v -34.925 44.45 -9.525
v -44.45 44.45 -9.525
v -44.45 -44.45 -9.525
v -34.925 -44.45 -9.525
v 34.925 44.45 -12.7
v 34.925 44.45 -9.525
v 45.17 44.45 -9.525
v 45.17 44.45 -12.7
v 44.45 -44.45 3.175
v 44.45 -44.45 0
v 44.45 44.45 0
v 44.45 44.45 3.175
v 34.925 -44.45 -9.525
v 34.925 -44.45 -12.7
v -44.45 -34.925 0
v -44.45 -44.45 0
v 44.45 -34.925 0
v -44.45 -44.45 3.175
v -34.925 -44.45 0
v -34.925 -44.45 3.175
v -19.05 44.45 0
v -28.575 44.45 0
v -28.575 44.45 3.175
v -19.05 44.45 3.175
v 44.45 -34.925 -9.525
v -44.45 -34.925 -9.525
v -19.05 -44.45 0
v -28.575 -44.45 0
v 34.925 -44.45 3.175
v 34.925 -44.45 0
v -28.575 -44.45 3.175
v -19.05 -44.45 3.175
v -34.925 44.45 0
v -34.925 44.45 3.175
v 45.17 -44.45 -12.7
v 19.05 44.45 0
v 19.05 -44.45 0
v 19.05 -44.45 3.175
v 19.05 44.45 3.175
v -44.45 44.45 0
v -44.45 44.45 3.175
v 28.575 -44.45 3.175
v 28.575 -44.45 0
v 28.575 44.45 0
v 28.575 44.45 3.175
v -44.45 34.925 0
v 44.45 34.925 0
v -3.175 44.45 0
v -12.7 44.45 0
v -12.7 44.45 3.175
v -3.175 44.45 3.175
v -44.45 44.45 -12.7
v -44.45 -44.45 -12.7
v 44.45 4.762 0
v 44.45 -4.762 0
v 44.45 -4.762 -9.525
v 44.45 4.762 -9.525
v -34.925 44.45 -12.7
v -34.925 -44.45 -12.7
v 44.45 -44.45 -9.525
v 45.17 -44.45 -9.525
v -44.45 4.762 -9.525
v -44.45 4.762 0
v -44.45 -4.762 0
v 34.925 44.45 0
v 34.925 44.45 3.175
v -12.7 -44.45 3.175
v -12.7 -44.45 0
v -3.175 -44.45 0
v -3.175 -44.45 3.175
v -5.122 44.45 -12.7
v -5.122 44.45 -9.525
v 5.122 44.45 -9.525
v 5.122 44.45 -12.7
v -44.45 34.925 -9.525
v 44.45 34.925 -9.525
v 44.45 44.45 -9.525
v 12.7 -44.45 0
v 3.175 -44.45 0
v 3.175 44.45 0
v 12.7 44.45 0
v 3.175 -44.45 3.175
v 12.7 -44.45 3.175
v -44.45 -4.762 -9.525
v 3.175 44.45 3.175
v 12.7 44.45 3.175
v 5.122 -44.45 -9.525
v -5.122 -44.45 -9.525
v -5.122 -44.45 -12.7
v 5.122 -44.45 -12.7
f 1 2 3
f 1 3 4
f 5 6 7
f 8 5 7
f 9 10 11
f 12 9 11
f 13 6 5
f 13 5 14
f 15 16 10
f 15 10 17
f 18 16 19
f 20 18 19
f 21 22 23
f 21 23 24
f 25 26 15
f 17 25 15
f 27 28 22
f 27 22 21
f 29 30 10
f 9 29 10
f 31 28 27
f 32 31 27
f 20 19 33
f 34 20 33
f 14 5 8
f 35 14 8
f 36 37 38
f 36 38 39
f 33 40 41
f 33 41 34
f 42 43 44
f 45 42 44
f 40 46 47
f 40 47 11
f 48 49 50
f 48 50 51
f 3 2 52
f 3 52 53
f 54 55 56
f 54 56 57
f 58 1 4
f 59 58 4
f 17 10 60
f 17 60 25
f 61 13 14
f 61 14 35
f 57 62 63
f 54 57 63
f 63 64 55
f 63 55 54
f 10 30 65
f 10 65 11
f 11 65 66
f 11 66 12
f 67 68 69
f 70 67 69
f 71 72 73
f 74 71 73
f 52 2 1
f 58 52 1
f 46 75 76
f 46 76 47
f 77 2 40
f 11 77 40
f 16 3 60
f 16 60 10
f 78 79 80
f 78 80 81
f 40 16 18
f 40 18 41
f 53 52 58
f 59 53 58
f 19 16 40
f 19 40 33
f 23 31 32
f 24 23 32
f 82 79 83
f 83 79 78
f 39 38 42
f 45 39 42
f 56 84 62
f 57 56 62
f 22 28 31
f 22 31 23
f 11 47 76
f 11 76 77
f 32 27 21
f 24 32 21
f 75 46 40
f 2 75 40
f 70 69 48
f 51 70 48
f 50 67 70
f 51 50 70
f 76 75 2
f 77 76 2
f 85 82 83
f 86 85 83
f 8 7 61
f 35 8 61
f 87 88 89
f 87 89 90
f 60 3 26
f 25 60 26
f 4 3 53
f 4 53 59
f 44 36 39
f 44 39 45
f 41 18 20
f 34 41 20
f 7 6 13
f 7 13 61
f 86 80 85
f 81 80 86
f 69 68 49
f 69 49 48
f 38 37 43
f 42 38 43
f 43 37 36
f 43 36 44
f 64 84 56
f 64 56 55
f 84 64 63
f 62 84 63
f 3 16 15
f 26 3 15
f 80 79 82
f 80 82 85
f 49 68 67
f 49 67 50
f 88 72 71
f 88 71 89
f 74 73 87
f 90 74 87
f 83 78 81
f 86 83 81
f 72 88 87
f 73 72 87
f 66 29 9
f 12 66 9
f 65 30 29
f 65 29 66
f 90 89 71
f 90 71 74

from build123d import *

# Parameters (mm, degrees)
F1_W          = 9.525
F1_H          = 88.9
F2_DEPTH      = 3.175
F3_W          = 9.525
F3_H          = 9.525
F4_DEPTH      = 44.45
F4_DEPTH_BACK = 44.45
F5_W          = 10.2447643876
F5_H          = 88.9
F6_DEPTH      = 3.175
F5_W_2        = 9.5249999999


# Not quite as in the source:
# - a variable given as a bare number and used for a length is read in inches; the dataset says mm whatever the document's units were


with BuildPart() as f2:
    # F1 (on Top) → F2 (new body)
    with BuildSketch(Plane.XY):
        with Locations((-39.6875, 0)):
            Rectangle(F1_W, F1_H)
    extrude(amount=F2_DEPTH)


with BuildPart() as f2b:
    # F1 (on Top) → F2, piece 2 (new body)
    with BuildSketch(Plane.XY):
        with Locations((-23.8125, 0)):
            Rectangle(F1_W, F1_H)
    extrude(amount=F2_DEPTH)


with BuildPart() as f2c:
    # F1 (on Top) → F2, piece 3 (new body)
    with BuildSketch(Plane.XY):
        with Locations((-7.9375, 0)):
            Rectangle(F1_W, F1_H)
    extrude(amount=F2_DEPTH)


with BuildPart() as f2d:
    # F1 (on Top) → F2, piece 4 (new body)
    with BuildSketch(Plane.XY):
        with Locations((7.9375, 0)):
            Rectangle(F1_W, F1_H)
    extrude(amount=F2_DEPTH)


with BuildPart() as f2e:
    # F1 (on Top) → F2, piece 5 (new body)
    with BuildSketch(Plane.XY):
        with Locations((23.8125, 0)):
            Rectangle(F1_W, F1_H)
    extrude(amount=F2_DEPTH)


with BuildPart() as f2f:
    # F1 (on Top) → F2, piece 6 (new body)
    with BuildSketch(Plane.XY):
        with Locations((39.6875, 0)):
            Rectangle(F1_W, F1_H)
    extrude(amount=F2_DEPTH)


with BuildPart() as f4:
    # F3 (on Right) → F4 (new body, two sides)
    with BuildSketch(Plane.YZ) as f4_sk:
        with Locations((-39.6875, -4.7625)):
            Rectangle(F3_W, F3_H)
    extrude(amount=F4_DEPTH)
    extrude(f4_sk.sketch, amount=-F4_DEPTH_BACK)


with BuildPart() as f4b:
    # F3 (on Right) → F4, piece 2 (new body, two sides)
    with BuildSketch(Plane.YZ) as f4_2_sk:
        with Locations((39.6875, -4.7625)):
            Rectangle(F3_W, F3_H)
    extrude(amount=F4_DEPTH)
    extrude(f4_2_sk.sketch, amount=-F4_DEPTH_BACK)


with BuildPart() as f4c:
    # F3 (on Right) → F4, piece 3 (new body, two sides)
    with BuildSketch(Plane.YZ) as f4_3_sk:
        with Locations((0, -4.7625)):
            Rectangle(F3_W, F3_H)
    extrude(amount=F4_DEPTH)
    extrude(f4_3_sk.sketch, amount=-F4_DEPTH_BACK)


with BuildPart() as f6:
    # F5 (on face) → F6 (new body)
    with BuildSketch(Plane(origin=(0, 0, -9.525), x_dir=(1, 0, 0), z_dir=(0, 0, -1))):
        with Locations((40.0473821938, 0)):
            Rectangle(F5_W, F5_H)
    extrude(amount=F6_DEPTH)


with BuildPart() as f6b:
    # F5 (on face) → F6, piece 2 (new body)
    with BuildSketch(Plane(origin=(0, 0, -9.525), x_dir=(1, 0, 0), z_dir=(0, 0, -1))):
        with Locations((-39.6874999999, 0)):
            Rectangle(F5_W_2, F5_H)
    extrude(amount=F6_DEPTH)


with BuildPart() as f6c:
    # F5 (on face) → F6, piece 3 (new body)
    with BuildSketch(Plane(origin=(0, 0, -9.525), x_dir=(1, 0, 0), z_dir=(0, 0, -1))):
        Rectangle(F5_W, F5_H)
    extrude(amount=F6_DEPTH)


solid = Compound([f2.part, f2b.part, f2c.part, f2d.part, f2e.part, f2f.part, f4.part, f4b.part, f4c.part, f6.part, f6b.part, f6c.part])
